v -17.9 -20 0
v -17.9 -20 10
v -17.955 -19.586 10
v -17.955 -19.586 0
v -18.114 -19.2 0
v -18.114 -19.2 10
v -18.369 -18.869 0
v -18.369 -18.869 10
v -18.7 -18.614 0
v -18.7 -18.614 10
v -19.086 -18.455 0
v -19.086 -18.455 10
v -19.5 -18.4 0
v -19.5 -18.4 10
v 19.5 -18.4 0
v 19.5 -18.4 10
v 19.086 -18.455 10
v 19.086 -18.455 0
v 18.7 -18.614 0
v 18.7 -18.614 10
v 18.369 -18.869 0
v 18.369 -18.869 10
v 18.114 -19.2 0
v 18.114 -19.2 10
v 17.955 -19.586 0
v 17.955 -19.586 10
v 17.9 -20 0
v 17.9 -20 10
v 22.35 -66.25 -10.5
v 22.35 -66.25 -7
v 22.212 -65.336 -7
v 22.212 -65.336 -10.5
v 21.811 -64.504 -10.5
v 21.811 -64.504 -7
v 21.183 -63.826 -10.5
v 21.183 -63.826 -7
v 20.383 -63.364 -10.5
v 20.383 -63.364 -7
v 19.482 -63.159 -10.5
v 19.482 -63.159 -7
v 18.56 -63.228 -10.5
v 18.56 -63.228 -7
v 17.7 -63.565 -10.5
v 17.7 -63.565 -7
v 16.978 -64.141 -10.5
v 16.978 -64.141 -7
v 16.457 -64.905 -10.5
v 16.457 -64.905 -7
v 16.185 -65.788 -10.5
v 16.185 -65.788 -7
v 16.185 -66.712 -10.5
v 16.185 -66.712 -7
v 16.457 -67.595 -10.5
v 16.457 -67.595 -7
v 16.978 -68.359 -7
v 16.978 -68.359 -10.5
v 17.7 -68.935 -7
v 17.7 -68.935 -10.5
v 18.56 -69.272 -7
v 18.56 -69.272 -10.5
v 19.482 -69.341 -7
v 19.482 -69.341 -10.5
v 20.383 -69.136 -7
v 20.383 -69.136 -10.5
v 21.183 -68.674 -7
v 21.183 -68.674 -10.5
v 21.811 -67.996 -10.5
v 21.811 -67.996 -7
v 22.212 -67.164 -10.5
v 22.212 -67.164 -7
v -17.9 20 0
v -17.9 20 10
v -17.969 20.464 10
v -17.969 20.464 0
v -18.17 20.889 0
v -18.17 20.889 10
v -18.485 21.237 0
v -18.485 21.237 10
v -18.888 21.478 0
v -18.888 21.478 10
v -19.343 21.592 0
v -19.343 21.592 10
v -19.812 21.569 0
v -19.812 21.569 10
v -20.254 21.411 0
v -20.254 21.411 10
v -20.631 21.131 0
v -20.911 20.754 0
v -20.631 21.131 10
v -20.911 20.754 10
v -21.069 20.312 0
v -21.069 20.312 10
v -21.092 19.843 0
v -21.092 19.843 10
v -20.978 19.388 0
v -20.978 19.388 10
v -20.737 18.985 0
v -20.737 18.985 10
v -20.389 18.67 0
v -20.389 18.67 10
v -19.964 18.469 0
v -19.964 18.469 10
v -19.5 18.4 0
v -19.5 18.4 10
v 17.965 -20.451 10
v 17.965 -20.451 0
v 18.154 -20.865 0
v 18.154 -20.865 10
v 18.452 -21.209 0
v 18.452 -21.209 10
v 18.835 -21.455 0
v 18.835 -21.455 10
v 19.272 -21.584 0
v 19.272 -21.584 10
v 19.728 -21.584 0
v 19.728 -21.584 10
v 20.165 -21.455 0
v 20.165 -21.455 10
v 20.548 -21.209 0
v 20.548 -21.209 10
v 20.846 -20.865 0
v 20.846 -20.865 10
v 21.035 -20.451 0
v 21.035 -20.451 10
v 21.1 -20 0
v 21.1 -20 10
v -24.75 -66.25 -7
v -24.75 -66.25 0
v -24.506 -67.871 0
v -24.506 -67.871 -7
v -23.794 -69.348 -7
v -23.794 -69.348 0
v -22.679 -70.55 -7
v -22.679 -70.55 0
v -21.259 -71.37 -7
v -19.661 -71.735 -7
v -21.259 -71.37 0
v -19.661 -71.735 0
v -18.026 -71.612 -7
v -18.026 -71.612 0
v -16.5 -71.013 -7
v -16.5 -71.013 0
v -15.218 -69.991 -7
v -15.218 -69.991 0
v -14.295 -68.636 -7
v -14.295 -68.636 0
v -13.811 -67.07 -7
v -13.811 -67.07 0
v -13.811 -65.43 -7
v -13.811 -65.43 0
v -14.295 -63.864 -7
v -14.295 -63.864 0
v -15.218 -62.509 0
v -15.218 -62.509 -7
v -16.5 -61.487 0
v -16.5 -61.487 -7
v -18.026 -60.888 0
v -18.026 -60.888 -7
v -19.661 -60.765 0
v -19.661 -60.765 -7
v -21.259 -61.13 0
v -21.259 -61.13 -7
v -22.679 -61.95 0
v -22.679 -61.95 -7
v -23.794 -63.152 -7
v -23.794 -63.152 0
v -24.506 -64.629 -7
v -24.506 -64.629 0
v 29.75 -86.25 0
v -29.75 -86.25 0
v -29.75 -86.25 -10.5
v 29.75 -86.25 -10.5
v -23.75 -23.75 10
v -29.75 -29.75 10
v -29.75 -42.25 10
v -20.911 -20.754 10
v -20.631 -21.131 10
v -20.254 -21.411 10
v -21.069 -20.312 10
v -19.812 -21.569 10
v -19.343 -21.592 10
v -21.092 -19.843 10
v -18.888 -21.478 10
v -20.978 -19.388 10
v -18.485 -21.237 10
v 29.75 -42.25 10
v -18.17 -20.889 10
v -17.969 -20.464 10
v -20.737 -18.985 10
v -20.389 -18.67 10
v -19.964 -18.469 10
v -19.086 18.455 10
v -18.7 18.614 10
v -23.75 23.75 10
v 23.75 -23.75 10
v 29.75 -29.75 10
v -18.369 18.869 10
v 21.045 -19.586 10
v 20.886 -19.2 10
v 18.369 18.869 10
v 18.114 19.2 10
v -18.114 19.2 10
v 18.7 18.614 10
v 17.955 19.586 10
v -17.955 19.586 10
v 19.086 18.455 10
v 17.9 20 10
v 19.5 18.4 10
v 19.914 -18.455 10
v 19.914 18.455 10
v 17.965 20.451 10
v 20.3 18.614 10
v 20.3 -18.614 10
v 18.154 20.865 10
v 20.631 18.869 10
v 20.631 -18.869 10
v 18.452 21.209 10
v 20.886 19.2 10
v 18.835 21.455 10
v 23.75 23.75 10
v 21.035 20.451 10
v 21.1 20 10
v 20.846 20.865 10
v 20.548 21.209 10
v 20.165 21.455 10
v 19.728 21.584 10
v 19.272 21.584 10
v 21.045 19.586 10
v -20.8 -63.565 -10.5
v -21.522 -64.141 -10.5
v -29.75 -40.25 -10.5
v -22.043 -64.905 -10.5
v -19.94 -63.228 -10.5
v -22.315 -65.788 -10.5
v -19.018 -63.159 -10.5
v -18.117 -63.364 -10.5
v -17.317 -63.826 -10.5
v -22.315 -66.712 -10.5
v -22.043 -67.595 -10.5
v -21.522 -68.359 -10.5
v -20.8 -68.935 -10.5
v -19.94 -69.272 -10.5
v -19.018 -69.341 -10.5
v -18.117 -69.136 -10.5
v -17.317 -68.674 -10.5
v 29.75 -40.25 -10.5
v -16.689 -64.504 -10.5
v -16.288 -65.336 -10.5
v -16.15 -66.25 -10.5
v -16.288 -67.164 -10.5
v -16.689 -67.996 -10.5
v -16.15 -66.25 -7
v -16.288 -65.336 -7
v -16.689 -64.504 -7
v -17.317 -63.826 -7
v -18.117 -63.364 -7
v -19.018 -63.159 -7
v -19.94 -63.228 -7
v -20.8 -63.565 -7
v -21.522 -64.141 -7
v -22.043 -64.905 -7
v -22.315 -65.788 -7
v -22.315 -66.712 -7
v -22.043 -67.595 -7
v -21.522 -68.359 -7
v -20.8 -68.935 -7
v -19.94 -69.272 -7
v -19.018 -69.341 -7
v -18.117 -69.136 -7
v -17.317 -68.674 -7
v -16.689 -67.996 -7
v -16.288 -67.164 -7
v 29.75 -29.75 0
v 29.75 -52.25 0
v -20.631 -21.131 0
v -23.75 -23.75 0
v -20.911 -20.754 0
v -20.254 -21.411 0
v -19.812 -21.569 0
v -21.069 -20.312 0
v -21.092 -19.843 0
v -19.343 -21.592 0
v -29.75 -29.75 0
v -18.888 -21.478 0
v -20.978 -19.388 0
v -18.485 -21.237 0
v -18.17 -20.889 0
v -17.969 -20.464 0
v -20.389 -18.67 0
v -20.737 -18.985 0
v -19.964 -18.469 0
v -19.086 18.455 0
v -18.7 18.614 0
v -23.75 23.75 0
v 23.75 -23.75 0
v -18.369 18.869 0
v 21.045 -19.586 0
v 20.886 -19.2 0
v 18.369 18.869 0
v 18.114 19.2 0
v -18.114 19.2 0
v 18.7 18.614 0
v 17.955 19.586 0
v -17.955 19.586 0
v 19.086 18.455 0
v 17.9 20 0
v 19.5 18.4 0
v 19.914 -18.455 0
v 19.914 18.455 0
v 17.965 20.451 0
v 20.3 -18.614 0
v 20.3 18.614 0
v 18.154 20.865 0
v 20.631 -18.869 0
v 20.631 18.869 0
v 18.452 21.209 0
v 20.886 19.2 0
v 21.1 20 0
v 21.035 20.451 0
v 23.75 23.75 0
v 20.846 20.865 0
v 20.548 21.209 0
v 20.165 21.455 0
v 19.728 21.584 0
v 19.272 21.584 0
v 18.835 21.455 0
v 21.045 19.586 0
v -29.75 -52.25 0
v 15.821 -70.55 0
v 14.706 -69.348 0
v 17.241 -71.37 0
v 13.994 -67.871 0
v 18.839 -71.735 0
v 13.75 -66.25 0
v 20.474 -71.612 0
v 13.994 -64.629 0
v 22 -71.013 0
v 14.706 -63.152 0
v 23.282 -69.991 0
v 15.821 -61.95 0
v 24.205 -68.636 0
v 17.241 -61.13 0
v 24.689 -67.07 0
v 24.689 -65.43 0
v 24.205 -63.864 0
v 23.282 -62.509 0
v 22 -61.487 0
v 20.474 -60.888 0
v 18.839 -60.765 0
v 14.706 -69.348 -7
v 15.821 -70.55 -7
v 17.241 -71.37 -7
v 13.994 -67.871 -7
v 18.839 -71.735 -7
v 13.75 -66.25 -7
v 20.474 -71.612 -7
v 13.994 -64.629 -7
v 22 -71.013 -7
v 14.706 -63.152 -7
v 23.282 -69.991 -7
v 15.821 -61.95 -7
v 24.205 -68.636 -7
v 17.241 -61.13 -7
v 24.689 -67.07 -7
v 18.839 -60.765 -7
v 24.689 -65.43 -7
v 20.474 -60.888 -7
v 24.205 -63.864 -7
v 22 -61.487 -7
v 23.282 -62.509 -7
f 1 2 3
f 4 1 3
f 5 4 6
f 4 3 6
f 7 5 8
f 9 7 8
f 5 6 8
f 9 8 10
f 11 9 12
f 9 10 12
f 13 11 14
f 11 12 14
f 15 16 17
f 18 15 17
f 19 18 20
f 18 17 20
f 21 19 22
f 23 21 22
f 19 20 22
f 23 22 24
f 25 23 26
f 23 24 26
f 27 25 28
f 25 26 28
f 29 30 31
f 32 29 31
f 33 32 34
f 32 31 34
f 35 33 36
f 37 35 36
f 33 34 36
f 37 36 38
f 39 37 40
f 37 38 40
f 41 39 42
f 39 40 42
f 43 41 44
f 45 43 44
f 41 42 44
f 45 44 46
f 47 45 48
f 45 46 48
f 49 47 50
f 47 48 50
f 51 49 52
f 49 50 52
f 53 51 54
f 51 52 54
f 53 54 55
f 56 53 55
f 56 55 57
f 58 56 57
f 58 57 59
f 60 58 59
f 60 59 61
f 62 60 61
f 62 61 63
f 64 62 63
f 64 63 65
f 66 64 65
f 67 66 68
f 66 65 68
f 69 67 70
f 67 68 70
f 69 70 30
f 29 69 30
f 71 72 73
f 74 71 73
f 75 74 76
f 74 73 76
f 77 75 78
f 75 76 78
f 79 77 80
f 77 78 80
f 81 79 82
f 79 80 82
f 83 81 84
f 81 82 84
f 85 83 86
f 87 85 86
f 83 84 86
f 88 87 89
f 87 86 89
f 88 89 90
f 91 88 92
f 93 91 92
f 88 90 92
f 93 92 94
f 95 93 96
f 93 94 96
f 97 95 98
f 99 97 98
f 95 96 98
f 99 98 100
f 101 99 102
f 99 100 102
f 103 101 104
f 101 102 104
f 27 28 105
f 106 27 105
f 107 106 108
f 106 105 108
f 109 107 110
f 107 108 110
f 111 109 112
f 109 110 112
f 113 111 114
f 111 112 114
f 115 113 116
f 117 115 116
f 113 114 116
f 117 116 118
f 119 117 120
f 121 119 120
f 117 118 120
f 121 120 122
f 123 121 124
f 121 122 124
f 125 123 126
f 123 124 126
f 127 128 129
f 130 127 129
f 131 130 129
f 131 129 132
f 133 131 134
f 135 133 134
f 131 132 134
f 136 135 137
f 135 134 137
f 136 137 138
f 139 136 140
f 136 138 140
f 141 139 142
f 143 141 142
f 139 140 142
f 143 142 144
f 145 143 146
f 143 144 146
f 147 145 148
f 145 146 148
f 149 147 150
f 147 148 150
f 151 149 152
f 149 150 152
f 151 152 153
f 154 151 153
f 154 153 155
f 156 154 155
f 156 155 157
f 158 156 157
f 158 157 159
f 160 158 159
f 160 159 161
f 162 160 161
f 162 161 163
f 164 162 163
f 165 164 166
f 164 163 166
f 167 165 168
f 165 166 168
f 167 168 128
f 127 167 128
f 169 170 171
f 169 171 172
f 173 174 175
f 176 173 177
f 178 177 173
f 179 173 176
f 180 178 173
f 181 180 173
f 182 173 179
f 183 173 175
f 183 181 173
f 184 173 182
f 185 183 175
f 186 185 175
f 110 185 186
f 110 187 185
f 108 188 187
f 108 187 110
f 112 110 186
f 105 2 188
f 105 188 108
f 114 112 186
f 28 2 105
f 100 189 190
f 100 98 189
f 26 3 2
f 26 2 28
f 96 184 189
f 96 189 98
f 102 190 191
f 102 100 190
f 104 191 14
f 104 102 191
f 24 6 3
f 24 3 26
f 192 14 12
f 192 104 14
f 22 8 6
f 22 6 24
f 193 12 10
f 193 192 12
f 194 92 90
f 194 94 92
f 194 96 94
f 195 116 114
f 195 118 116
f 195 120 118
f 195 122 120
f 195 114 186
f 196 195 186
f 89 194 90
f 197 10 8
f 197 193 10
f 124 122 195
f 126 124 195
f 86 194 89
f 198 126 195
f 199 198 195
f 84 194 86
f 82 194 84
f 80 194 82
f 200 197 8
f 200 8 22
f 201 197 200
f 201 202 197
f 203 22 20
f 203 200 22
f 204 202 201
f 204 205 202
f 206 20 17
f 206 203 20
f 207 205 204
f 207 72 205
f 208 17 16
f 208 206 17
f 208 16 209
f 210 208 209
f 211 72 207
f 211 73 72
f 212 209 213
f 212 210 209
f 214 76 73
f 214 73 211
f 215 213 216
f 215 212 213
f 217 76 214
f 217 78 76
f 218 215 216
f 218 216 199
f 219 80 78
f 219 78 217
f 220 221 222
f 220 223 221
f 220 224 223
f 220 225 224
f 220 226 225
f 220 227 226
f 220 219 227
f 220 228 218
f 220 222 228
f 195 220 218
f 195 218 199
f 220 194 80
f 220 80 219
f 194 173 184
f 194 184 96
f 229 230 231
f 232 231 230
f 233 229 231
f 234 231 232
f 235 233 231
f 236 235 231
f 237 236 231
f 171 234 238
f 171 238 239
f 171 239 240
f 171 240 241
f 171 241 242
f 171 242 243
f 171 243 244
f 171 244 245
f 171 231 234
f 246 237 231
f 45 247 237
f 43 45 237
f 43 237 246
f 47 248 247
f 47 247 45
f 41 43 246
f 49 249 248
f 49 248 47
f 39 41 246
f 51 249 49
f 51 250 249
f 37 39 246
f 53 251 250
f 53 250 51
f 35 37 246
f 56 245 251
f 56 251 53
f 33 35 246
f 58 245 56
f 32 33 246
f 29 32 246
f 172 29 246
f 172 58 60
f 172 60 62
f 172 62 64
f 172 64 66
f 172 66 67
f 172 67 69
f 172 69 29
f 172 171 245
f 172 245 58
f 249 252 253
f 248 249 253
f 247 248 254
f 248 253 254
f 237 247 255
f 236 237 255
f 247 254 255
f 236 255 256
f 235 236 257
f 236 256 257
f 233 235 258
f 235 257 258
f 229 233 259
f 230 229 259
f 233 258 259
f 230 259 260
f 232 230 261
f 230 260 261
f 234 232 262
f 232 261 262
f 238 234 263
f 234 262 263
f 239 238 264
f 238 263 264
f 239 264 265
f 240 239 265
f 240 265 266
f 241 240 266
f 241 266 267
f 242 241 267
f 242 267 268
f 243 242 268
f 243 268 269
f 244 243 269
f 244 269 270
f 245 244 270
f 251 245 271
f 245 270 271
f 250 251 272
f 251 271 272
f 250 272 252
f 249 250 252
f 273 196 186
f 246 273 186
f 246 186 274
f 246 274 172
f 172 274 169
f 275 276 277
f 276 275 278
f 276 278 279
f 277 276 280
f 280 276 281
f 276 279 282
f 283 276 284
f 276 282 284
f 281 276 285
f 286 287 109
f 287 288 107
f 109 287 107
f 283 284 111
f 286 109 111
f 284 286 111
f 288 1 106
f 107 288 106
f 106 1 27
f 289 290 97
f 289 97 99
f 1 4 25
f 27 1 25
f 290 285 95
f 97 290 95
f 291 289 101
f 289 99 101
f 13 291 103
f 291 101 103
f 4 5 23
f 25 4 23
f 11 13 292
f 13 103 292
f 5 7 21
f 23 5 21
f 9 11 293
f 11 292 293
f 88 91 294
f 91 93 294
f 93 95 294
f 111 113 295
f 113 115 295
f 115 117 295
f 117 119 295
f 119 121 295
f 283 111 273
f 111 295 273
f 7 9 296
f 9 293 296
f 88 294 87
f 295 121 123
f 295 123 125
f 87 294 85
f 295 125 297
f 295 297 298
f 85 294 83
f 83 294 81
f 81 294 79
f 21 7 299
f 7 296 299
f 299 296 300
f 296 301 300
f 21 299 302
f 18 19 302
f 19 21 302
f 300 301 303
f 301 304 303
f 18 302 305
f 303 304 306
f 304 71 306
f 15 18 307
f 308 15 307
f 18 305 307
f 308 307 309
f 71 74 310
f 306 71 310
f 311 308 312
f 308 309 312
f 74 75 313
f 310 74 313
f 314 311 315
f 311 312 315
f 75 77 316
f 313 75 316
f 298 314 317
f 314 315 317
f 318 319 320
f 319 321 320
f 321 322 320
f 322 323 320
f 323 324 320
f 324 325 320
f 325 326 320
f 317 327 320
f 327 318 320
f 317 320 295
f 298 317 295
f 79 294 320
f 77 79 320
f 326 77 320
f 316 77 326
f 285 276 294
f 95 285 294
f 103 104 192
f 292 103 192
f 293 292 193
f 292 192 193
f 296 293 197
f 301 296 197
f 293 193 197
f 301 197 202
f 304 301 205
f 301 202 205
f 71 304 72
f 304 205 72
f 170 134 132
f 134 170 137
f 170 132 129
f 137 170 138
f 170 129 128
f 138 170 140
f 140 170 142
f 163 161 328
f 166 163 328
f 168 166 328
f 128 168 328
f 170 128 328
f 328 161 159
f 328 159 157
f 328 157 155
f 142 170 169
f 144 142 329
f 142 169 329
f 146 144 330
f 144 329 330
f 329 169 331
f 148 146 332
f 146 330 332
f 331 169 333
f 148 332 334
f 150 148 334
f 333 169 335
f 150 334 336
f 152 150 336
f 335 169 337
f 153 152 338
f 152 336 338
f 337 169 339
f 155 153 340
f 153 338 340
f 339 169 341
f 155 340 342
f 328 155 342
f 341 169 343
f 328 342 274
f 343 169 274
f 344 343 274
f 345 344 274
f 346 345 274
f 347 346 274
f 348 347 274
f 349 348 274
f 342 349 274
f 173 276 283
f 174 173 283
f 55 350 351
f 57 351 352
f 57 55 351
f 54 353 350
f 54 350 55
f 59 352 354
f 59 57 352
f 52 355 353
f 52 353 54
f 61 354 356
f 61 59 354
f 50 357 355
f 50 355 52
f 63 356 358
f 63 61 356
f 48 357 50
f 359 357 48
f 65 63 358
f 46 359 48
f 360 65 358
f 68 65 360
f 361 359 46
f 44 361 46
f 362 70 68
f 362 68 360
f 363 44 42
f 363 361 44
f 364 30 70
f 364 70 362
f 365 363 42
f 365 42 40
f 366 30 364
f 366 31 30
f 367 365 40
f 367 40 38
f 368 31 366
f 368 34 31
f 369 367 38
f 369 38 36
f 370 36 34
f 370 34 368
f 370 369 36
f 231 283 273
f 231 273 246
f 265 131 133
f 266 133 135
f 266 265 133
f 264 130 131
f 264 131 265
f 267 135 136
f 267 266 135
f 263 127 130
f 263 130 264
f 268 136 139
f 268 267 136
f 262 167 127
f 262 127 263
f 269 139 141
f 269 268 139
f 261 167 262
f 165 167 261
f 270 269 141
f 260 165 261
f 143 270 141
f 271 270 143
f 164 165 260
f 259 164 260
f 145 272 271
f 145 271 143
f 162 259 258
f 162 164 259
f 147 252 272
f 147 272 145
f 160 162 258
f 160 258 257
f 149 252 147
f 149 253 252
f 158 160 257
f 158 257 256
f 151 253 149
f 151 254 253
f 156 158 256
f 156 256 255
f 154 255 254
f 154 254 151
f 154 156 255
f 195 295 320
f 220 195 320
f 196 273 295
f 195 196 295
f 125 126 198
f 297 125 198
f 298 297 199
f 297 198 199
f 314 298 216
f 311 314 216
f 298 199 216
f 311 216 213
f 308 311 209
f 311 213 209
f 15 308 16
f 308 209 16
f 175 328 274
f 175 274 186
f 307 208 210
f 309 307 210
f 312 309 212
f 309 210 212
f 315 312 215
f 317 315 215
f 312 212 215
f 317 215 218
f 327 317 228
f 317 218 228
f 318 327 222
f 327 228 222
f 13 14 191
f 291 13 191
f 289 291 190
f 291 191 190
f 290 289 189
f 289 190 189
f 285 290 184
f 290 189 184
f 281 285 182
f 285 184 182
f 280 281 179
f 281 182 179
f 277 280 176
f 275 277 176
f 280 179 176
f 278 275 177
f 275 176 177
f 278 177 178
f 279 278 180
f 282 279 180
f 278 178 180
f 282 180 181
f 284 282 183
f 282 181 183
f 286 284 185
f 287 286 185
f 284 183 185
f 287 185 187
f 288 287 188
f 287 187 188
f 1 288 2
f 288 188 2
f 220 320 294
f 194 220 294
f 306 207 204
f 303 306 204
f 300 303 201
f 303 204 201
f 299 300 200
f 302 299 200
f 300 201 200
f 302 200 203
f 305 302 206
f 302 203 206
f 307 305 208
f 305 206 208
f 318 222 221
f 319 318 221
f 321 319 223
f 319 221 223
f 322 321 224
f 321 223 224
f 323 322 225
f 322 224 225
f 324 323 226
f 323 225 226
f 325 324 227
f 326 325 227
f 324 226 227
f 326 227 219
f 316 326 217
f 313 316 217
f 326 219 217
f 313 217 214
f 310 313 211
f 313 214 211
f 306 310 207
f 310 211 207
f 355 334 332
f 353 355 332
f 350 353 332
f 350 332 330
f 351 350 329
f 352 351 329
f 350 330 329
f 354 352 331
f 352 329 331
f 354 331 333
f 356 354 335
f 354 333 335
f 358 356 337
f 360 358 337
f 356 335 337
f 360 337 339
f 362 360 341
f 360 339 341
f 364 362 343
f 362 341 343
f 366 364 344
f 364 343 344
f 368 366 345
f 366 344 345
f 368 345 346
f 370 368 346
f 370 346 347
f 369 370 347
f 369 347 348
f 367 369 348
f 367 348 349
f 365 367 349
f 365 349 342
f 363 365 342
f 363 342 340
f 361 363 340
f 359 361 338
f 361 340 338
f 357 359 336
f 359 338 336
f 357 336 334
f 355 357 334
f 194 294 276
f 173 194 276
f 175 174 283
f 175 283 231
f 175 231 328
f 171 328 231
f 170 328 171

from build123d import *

# Parameters (mm, degrees)
F1_DEPTH  = 10
F2_W      = 59.5
F2_H      = 56.5
F3_DEPTH  = 10.5
F5_DEPTH  = 59.501
F7_DEPTH  = 7
F8_R      = 3.1
F9_DEPTH  = 3.5
F10_R     = 3.1
F11_DEPTH = 3.5
F13_DEPTH = 10


with BuildPart() as f1:
    # F0 (on Top) → F1 (new body)
    with BuildSketch(Plane.XY):
        Polygon((23.75, -23.75), (23.75, 23.75), (-23.75, 23.75), (-23.75, -23.75), (-29.75, -29.75), (-29.75, -86.25), (29.75, -86.25), (29.75, -29.75), align=None)
    extrude(amount=F1_DEPTH)

    # F2 (on face) → F3 (join)
    with BuildSketch(Plane(origin=(0, 0, 0), x_dir=(1, 0, 0), z_dir=(0, 0, -1))):
        with Locations((0, 58)):
            Rectangle(F2_W, F2_H)
    extrude(amount=F3_DEPTH)

    # F4 (on face) → F5 (cut, through all)
    with BuildSketch(Plane.YZ.offset(29.75)):
        Polygon((-52.25, 0), (-42.25, 10), (-86.25, 10), (-86.25, 0), align=None)
        Polygon((-29.75, -10.5), (-29.75, 0), (-40.25, -10.5), align=None)
    extrude(amount=-F5_DEPTH, mode=Mode.SUBTRACT)

    # F6 (on face) → F7 (cut)
    with BuildSketch(Plane.XY):
        with BuildLine():
            ThreePointArc((-13.75, -66.25), (-19.25, -60.75), (-24.75, -66.25))
            Line((-24.75, -66.25), (-13.75, -66.25))
        make_face()
        with BuildLine():
            ThreePointArc((24.75, -66.25), (19.25, -60.75), (13.75, -66.25))
            Line((13.75, -66.25), (24.75, -66.25))
        make_face()
        with BuildLine():
            Line((24.75, -66.25), (13.75, -66.25))
            ThreePointArc((13.75, -66.25), (19.25, -71.75), (24.75, -66.25))
        make_face()
        with BuildLine():
            Line((-13.75, -66.25), (-24.75, -66.25))
            ThreePointArc((-24.75, -66.25), (-19.25, -71.75), (-13.75, -66.25))
        make_face()
    extrude(amount=-F7_DEPTH, mode=Mode.SUBTRACT)

    # F8 (on face) → F9 (cut, through all)
    with BuildSketch(Plane.XY.offset(-7)):
        with Locations((19.25, -66.25)):
            Circle(F8_R)
    extrude(amount=-F9_DEPTH, mode=Mode.SUBTRACT)

    # F10 (on face) → F11 (cut, through all)
    with BuildSketch(Plane.XY.offset(-7)):
        with Locations((-19.25, -66.25)):
            Circle(F10_R)
    extrude(amount=-F11_DEPTH, mode=Mode.SUBTRACT)

    # F12 (on face) → F13 (cut, through all)
    with BuildSketch(Plane.XY.offset(10)):
        with BuildLine():
            Line((-19.5, 18.4), (-19.5, 20))
            Line((-19.5, 20), (-17.9, 20))
            ThreePointArc((-17.9, 20), (-20.631371, 21.131371), (-19.5, 18.4))
        make_face()
        with BuildLine():
            Line((-17.9, 20), (-19.5, 20))
            Line((-19.5, 20), (-19.5, 18.4))
            ThreePointArc((-19.5, 18.4), (-18.368629, 18.868629), (-17.9, 20))
        make_face()
        with BuildLine():
            Line((19.5, 20), (17.9, 20))
            ThreePointArc((17.9, 20), (18.368629, 18.868629), (19.5, 18.4))
            Line((19.5, 18.4), (19.5, 20))
        make_face()
        with BuildLine():
            ThreePointArc((21.1, 20), (19.5, 21.6), (17.9, 20))
            Line((17.9, 20), (19.5, 20))
            Line((19.5, 20), (19.5, 18.4))
            ThreePointArc((19.5, 18.4), (20.631371, 18.868629), (21.1, 20))
        make_face()
        with BuildLine():
            ThreePointArc((-17.9, -20), (-18.368629, -18.868629), (-19.5, -18.4))
            Line((-19.5, -18.4), (-19.5, -20))
            Line((-19.5, -20), (-17.9, -20))
        make_face()
        with BuildLine():
            Line((-19.5, -20), (-19.5, -18.4))
            ThreePointArc((-19.5, -18.4), (-20.631371, -21.131371), (-17.9, -20))
            Line((-17.9, -20), (-19.5, -20))
        make_face()
        with BuildLine():
            Line((19.5, -20), (19.5, -18.4))
            ThreePointArc((19.5, -18.4), (18.368629, -18.868629), (17.9, -20))
            Line((17.9, -20), (19.5, -20))
        make_face()
        with BuildLine():
            ThreePointArc((21.1, -20), (20.631371, -18.868629), (19.5, -18.4))
            Line((19.5, -18.4), (19.5, -20))
            Line((19.5, -20), (17.9, -20))
            ThreePointArc((17.9, -20), (19.5, -21.6), (21.1, -20))
        make_face()
    extrude(amount=-F13_DEPTH, mode=Mode.SUBTRACT)


solid = f1.part
